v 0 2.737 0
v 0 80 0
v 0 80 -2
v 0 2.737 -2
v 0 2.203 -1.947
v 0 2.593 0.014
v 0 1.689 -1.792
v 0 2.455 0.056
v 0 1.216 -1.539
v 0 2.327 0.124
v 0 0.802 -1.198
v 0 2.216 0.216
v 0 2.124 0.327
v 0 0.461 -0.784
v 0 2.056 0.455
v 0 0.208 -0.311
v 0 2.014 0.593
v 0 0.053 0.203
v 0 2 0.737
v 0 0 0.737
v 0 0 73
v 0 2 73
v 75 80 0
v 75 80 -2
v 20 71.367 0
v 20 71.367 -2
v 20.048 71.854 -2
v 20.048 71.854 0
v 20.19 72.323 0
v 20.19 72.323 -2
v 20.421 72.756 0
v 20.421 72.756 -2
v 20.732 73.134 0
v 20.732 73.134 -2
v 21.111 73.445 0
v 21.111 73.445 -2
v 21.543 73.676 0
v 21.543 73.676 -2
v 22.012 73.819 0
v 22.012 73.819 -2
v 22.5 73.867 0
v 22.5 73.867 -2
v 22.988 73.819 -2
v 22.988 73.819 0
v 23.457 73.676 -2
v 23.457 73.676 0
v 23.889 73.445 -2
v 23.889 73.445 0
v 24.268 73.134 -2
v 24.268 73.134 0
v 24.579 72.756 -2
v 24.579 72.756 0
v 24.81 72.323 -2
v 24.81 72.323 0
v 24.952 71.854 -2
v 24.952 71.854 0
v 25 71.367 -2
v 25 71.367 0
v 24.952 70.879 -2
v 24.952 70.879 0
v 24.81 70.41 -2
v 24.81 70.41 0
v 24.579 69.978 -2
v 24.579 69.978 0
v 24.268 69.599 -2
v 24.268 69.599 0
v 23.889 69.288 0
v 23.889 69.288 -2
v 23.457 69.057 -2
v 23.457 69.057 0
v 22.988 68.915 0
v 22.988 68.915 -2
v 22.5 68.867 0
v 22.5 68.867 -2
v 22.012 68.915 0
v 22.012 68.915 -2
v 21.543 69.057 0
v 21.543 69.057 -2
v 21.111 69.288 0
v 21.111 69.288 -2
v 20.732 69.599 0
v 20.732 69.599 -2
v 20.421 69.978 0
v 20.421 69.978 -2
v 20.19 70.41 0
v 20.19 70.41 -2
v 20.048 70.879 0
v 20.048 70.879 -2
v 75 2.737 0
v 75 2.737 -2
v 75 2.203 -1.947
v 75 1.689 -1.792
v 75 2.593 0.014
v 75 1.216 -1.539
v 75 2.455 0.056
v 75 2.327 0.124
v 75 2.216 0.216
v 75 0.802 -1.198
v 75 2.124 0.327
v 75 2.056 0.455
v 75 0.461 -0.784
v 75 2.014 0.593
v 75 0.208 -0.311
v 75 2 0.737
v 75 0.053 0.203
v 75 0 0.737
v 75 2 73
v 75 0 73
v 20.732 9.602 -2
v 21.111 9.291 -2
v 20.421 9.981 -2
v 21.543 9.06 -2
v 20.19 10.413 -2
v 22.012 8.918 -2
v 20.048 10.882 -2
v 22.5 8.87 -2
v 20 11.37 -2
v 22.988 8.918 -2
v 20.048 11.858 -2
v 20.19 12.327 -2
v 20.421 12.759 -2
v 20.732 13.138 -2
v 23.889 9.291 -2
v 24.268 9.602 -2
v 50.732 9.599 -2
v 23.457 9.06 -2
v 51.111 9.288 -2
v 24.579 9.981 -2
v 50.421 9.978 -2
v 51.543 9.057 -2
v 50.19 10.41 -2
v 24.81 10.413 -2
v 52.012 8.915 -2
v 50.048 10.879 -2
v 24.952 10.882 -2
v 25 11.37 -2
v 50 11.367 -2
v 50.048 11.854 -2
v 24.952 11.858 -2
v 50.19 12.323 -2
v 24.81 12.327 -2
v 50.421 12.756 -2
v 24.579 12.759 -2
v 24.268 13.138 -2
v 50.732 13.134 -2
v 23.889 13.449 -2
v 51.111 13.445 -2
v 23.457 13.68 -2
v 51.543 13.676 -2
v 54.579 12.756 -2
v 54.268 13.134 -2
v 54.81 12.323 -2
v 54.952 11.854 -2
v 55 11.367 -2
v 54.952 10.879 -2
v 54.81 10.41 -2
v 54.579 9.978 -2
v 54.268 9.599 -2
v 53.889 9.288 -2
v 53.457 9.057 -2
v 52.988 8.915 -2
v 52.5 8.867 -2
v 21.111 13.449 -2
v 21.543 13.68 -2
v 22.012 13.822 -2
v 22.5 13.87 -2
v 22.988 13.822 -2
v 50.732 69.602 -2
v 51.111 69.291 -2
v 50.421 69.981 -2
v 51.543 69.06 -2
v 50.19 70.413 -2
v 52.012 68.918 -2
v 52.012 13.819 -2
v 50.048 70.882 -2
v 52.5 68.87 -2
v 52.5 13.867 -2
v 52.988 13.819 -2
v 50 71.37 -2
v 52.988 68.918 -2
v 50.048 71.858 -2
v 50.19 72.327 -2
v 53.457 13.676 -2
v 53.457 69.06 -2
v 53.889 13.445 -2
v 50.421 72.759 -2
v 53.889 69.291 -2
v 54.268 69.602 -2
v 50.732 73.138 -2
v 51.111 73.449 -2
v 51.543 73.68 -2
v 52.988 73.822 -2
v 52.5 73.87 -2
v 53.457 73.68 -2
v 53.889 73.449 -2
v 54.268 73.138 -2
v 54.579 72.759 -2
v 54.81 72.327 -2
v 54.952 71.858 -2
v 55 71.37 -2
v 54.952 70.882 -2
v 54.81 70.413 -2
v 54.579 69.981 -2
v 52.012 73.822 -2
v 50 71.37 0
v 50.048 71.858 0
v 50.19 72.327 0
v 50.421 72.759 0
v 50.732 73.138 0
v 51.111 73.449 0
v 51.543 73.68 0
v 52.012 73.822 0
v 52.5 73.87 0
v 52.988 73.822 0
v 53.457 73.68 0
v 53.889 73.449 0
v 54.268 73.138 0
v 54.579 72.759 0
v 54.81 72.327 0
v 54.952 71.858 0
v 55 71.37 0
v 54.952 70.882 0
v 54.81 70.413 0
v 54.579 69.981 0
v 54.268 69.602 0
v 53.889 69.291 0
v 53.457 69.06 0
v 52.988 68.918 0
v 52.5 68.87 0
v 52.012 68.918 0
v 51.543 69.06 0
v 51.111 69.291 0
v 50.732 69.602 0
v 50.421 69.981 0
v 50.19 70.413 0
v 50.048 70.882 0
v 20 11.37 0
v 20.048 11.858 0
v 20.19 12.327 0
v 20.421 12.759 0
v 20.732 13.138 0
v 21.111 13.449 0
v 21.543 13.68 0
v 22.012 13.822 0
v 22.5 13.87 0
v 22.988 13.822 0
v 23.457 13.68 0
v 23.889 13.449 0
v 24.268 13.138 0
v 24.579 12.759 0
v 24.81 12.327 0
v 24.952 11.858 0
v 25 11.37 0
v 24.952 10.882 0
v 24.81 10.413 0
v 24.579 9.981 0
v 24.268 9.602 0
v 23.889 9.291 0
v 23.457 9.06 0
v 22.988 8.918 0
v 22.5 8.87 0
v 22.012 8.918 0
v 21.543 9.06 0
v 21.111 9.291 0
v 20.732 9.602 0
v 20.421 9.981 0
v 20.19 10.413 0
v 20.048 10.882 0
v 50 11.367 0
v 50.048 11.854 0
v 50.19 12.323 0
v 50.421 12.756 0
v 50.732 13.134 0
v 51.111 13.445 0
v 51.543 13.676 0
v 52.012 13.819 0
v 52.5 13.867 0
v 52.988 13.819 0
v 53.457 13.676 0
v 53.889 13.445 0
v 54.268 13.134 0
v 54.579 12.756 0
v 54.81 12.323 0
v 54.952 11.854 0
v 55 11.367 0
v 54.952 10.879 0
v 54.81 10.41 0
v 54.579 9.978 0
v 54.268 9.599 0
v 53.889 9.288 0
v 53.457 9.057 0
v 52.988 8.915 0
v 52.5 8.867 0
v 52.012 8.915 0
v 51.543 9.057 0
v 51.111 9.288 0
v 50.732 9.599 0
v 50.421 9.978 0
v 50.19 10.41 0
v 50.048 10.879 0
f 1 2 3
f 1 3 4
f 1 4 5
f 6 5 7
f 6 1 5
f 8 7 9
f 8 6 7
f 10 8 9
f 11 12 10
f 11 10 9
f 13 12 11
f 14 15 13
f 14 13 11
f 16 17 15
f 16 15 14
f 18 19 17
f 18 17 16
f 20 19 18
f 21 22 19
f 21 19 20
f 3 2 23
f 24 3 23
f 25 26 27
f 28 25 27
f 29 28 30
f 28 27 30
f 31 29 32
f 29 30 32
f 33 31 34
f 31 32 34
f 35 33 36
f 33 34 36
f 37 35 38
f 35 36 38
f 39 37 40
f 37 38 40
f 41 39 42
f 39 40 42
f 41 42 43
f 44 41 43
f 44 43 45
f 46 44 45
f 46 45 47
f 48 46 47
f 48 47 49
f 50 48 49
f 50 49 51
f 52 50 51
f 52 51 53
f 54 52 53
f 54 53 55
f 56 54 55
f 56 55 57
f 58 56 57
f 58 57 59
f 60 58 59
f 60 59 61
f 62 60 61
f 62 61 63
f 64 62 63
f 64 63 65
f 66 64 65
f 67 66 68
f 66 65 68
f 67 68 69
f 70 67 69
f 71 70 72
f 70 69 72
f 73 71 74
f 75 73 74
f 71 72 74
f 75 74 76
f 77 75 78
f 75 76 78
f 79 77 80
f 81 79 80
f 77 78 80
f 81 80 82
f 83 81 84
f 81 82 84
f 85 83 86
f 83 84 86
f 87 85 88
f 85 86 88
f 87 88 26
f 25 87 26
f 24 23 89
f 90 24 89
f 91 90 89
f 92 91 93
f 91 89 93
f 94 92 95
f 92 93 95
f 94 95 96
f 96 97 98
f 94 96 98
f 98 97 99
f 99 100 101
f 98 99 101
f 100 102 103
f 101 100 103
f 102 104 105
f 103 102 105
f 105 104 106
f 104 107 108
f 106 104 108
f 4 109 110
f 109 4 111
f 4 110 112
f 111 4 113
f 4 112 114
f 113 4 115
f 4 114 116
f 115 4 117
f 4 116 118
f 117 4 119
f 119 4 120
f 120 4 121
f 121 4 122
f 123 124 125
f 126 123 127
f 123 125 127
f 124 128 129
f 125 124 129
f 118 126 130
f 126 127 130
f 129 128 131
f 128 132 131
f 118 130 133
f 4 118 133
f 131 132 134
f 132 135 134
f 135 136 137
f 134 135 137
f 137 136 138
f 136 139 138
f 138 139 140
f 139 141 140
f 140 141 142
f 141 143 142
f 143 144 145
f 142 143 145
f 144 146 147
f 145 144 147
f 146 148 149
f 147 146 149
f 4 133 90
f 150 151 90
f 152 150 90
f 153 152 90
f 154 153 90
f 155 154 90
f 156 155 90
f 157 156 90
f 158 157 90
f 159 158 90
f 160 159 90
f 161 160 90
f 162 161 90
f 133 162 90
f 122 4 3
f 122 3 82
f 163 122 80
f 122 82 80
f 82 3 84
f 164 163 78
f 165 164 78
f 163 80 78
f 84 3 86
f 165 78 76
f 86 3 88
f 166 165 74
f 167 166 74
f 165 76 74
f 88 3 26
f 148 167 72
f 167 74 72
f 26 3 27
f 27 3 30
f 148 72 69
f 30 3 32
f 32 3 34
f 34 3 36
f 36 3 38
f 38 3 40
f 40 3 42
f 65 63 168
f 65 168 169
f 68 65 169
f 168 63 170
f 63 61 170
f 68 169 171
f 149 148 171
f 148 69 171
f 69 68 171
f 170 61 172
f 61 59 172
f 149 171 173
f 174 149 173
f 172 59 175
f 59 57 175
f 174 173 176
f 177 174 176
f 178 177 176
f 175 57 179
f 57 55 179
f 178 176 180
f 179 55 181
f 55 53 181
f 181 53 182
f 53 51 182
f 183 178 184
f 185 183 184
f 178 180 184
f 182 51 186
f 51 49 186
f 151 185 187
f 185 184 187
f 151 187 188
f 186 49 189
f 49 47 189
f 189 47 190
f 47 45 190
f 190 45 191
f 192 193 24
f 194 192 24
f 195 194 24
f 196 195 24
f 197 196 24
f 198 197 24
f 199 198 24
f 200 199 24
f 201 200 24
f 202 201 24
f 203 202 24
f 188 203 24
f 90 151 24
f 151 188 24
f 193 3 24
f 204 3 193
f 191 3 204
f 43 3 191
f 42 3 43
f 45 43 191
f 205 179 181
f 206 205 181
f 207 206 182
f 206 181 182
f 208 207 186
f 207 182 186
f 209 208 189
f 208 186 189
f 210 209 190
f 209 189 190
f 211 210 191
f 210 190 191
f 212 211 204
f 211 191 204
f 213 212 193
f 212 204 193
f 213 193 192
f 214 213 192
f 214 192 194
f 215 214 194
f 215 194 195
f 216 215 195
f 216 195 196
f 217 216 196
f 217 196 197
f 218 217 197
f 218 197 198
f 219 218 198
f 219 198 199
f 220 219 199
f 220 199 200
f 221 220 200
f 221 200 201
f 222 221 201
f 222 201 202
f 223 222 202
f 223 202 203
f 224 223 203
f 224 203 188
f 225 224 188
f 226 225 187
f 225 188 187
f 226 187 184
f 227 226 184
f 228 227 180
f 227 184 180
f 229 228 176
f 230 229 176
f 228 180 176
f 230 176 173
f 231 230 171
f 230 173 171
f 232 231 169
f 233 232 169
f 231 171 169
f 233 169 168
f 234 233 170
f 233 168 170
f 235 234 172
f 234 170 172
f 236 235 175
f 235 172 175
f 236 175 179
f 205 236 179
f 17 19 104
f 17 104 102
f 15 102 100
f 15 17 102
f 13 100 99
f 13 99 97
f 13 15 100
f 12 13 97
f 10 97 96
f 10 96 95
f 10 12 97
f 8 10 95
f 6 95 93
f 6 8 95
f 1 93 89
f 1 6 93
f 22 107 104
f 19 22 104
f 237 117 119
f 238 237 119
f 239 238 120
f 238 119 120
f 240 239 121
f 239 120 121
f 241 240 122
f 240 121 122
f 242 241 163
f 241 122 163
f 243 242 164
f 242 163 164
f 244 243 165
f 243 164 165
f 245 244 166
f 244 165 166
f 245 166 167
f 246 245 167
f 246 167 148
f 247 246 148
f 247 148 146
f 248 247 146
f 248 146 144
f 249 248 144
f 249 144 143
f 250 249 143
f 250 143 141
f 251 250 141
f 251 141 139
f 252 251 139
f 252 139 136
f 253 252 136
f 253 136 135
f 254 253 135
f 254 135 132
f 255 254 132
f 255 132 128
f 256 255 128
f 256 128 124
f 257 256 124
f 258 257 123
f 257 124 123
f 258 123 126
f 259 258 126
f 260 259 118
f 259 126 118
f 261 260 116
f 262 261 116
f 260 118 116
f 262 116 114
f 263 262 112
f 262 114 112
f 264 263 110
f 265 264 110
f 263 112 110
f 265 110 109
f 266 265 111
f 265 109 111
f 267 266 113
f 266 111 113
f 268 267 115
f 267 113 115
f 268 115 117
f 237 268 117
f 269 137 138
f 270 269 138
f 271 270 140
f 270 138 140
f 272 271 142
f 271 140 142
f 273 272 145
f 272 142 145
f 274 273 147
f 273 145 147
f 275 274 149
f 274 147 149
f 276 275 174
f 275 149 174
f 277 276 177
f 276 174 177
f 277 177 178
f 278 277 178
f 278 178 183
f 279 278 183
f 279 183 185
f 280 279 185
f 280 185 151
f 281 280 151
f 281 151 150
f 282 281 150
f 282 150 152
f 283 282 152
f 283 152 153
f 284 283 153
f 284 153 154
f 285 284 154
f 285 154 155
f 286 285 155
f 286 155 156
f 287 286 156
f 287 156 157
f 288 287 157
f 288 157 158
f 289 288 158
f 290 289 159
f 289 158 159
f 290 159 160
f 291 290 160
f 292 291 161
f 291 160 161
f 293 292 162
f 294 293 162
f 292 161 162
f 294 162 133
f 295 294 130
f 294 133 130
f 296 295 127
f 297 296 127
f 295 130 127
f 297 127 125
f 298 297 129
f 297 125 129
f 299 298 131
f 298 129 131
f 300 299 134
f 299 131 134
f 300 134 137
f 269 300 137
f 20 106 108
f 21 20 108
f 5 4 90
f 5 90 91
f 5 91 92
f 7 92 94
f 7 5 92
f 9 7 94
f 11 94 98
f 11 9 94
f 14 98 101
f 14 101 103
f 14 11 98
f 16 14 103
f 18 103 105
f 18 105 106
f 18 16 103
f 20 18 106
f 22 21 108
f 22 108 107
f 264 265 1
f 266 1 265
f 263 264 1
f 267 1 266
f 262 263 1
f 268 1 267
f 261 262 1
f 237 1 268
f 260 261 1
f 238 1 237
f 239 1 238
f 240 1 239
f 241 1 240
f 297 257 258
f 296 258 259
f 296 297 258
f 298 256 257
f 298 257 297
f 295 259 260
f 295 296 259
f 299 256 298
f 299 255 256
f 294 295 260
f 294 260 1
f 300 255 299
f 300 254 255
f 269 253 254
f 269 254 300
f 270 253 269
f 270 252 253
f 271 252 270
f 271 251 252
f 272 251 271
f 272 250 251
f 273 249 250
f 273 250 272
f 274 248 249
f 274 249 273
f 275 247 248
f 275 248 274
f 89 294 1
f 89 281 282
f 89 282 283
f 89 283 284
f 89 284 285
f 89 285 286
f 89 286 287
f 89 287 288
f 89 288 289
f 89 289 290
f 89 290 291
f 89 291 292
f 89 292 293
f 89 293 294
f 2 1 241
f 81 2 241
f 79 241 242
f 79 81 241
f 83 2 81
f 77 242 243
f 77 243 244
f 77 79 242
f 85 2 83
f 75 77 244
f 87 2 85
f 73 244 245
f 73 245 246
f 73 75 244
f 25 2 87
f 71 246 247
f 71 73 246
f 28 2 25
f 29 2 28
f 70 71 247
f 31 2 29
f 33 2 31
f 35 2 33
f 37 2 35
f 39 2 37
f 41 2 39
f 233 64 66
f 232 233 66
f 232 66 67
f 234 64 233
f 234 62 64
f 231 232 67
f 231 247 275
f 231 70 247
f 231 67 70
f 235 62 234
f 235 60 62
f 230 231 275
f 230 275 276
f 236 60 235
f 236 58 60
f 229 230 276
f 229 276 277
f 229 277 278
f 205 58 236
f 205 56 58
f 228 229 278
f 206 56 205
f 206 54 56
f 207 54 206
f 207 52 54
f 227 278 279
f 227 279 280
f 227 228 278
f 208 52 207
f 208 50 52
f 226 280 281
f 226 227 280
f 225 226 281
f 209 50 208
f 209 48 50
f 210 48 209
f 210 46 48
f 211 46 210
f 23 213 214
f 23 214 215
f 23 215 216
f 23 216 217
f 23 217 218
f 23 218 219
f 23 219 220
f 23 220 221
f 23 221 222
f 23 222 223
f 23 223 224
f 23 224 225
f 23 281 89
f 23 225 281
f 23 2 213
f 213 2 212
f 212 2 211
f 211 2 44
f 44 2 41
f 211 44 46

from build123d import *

# Parameters (mm, degrees)
SKETCH2_W                    = 75
SKETCH2_H                    = 80
BASE_FLANGE1_DEPTH           = 2
EDGE_FLANGE1_STRIP_W         = 9.4732
EDGE_FLANGE1_STRIP_H         = 2
EDGE_FLANGE1_STRIP_CUT_DEPTH = 75
EDGE_FLANGE1_DEPTH           = 75
CUT_EXTRUDE1_REACH           = 134.853
SKETCH10_R                   = 2.5


# Sheet-metal steps are written as plain solids
with BuildPart() as part:
    # Sketch2 → Base-Flange1 (new body)
    with BuildSketch(Plane.XY):
        with Locations((37.5, 40)):
            Rectangle(SKETCH2_W, SKETCH2_H)
    extrude(amount=-BASE_FLANGE1_DEPTH)

    # Edge-Flange1 strip (across the edge) → Edge-Flange1 strip cut (cut)
    with BuildSketch(Plane.YZ):
        with Locations((-2, -1)):
            Rectangle(EDGE_FLANGE1_STRIP_W, EDGE_FLANGE1_STRIP_H)
    extrude(amount=EDGE_FLANGE1_STRIP_CUT_DEPTH, mode=Mode.SUBTRACT)

    # Edge-Flange1 section (across the edge) → Edge-Flange1 (add)
    with BuildSketch(Plane.YZ):
        with BuildLine():
            Line((0, 0.7366), (0, 73))
            Line((0, 73), (2, 73))
            Line((2, 73), (2, 0.7366))
            ThreePointArc((2, 0.7366), (2.215745145, 0.215745145), (2.7366, 0))
            Line((2.7366, 0), (2.7366, -2))
            ThreePointArc((2.7366, -2), (0.801531583, -1.198468417), (0, 0.7366))
        make_face()
    extrude(amount=EDGE_FLANGE1_DEPTH)

    # Sketch10 → Cut-Extrude1 (cut, up to next)
    with BuildSketch(Plane(origin=(0, 0, -2), x_dir=(-1, 0, 0), z_dir=(0, 0, -1)), mode=Mode.PRIVATE) as cut_extrude1_sk1:
        with Locations((-22.5, 11.37)):
            Circle(SKETCH10_R)
    cut_extrude1_tool1 = extrude(cut_extrude1_sk1.sketch, amount=-CUT_EXTRUDE1_REACH, mode=Mode.PRIVATE) & part.part
    # Sketch10 → Cut-Extrude1 (cut, up to next)
    with BuildSketch(Plane(origin=(0, 0, -2), x_dir=(-1, 0, 0), z_dir=(0, 0, -1)), mode=Mode.PRIVATE) as cut_extrude1_sk2:
        with Locations((-52.5, 71.37)):
            Circle(SKETCH10_R)
    cut_extrude1_tool2 = extrude(cut_extrude1_sk2.sketch, amount=-CUT_EXTRUDE1_REACH, mode=Mode.PRIVATE) & part.part
    # Sketch10 → Cut-Extrude1 (cut, up to next)
    with BuildSketch(Plane(origin=(0, 0, -2), x_dir=(-1, 0, 0), z_dir=(0, 0, -1)), mode=Mode.PRIVATE) as cut_extrude1_sk3:
        with Locations((-52.5, 11.3666)):
            Circle(SKETCH10_R)
    cut_extrude1_tool3 = extrude(cut_extrude1_sk3.sketch, amount=-CUT_EXTRUDE1_REACH, mode=Mode.PRIVATE) & part.part
    # Sketch10 → Cut-Extrude1 (cut, up to next)
    with BuildSketch(Plane(origin=(0, 0, -2), x_dir=(-1, 0, 0), z_dir=(0, 0, -1)), mode=Mode.PRIVATE) as cut_extrude1_sk4:
        with Locations((-22.5, 71.3666)):
            Circle(SKETCH10_R)
    cut_extrude1_tool4 = extrude(cut_extrude1_sk4.sketch, amount=-CUT_EXTRUDE1_REACH, mode=Mode.PRIVATE) & part.part
    add(cut_extrude1_tool1.solids().sort_by_distance((22.5, 11.37, -2))[0], mode=Mode.SUBTRACT)
    add(cut_extrude1_tool2.solids().sort_by_distance((52.5, 71.37, -2))[0], mode=Mode.SUBTRACT)
    add(cut_extrude1_tool3.solids().sort_by_distance((52.5, 11.3666, -2))[0], mode=Mode.SUBTRACT)
    add(cut_extrude1_tool4.solids().sort_by_distance((22.5, 71.3666, -2))[0], mode=Mode.SUBTRACT)


solid = part.part
